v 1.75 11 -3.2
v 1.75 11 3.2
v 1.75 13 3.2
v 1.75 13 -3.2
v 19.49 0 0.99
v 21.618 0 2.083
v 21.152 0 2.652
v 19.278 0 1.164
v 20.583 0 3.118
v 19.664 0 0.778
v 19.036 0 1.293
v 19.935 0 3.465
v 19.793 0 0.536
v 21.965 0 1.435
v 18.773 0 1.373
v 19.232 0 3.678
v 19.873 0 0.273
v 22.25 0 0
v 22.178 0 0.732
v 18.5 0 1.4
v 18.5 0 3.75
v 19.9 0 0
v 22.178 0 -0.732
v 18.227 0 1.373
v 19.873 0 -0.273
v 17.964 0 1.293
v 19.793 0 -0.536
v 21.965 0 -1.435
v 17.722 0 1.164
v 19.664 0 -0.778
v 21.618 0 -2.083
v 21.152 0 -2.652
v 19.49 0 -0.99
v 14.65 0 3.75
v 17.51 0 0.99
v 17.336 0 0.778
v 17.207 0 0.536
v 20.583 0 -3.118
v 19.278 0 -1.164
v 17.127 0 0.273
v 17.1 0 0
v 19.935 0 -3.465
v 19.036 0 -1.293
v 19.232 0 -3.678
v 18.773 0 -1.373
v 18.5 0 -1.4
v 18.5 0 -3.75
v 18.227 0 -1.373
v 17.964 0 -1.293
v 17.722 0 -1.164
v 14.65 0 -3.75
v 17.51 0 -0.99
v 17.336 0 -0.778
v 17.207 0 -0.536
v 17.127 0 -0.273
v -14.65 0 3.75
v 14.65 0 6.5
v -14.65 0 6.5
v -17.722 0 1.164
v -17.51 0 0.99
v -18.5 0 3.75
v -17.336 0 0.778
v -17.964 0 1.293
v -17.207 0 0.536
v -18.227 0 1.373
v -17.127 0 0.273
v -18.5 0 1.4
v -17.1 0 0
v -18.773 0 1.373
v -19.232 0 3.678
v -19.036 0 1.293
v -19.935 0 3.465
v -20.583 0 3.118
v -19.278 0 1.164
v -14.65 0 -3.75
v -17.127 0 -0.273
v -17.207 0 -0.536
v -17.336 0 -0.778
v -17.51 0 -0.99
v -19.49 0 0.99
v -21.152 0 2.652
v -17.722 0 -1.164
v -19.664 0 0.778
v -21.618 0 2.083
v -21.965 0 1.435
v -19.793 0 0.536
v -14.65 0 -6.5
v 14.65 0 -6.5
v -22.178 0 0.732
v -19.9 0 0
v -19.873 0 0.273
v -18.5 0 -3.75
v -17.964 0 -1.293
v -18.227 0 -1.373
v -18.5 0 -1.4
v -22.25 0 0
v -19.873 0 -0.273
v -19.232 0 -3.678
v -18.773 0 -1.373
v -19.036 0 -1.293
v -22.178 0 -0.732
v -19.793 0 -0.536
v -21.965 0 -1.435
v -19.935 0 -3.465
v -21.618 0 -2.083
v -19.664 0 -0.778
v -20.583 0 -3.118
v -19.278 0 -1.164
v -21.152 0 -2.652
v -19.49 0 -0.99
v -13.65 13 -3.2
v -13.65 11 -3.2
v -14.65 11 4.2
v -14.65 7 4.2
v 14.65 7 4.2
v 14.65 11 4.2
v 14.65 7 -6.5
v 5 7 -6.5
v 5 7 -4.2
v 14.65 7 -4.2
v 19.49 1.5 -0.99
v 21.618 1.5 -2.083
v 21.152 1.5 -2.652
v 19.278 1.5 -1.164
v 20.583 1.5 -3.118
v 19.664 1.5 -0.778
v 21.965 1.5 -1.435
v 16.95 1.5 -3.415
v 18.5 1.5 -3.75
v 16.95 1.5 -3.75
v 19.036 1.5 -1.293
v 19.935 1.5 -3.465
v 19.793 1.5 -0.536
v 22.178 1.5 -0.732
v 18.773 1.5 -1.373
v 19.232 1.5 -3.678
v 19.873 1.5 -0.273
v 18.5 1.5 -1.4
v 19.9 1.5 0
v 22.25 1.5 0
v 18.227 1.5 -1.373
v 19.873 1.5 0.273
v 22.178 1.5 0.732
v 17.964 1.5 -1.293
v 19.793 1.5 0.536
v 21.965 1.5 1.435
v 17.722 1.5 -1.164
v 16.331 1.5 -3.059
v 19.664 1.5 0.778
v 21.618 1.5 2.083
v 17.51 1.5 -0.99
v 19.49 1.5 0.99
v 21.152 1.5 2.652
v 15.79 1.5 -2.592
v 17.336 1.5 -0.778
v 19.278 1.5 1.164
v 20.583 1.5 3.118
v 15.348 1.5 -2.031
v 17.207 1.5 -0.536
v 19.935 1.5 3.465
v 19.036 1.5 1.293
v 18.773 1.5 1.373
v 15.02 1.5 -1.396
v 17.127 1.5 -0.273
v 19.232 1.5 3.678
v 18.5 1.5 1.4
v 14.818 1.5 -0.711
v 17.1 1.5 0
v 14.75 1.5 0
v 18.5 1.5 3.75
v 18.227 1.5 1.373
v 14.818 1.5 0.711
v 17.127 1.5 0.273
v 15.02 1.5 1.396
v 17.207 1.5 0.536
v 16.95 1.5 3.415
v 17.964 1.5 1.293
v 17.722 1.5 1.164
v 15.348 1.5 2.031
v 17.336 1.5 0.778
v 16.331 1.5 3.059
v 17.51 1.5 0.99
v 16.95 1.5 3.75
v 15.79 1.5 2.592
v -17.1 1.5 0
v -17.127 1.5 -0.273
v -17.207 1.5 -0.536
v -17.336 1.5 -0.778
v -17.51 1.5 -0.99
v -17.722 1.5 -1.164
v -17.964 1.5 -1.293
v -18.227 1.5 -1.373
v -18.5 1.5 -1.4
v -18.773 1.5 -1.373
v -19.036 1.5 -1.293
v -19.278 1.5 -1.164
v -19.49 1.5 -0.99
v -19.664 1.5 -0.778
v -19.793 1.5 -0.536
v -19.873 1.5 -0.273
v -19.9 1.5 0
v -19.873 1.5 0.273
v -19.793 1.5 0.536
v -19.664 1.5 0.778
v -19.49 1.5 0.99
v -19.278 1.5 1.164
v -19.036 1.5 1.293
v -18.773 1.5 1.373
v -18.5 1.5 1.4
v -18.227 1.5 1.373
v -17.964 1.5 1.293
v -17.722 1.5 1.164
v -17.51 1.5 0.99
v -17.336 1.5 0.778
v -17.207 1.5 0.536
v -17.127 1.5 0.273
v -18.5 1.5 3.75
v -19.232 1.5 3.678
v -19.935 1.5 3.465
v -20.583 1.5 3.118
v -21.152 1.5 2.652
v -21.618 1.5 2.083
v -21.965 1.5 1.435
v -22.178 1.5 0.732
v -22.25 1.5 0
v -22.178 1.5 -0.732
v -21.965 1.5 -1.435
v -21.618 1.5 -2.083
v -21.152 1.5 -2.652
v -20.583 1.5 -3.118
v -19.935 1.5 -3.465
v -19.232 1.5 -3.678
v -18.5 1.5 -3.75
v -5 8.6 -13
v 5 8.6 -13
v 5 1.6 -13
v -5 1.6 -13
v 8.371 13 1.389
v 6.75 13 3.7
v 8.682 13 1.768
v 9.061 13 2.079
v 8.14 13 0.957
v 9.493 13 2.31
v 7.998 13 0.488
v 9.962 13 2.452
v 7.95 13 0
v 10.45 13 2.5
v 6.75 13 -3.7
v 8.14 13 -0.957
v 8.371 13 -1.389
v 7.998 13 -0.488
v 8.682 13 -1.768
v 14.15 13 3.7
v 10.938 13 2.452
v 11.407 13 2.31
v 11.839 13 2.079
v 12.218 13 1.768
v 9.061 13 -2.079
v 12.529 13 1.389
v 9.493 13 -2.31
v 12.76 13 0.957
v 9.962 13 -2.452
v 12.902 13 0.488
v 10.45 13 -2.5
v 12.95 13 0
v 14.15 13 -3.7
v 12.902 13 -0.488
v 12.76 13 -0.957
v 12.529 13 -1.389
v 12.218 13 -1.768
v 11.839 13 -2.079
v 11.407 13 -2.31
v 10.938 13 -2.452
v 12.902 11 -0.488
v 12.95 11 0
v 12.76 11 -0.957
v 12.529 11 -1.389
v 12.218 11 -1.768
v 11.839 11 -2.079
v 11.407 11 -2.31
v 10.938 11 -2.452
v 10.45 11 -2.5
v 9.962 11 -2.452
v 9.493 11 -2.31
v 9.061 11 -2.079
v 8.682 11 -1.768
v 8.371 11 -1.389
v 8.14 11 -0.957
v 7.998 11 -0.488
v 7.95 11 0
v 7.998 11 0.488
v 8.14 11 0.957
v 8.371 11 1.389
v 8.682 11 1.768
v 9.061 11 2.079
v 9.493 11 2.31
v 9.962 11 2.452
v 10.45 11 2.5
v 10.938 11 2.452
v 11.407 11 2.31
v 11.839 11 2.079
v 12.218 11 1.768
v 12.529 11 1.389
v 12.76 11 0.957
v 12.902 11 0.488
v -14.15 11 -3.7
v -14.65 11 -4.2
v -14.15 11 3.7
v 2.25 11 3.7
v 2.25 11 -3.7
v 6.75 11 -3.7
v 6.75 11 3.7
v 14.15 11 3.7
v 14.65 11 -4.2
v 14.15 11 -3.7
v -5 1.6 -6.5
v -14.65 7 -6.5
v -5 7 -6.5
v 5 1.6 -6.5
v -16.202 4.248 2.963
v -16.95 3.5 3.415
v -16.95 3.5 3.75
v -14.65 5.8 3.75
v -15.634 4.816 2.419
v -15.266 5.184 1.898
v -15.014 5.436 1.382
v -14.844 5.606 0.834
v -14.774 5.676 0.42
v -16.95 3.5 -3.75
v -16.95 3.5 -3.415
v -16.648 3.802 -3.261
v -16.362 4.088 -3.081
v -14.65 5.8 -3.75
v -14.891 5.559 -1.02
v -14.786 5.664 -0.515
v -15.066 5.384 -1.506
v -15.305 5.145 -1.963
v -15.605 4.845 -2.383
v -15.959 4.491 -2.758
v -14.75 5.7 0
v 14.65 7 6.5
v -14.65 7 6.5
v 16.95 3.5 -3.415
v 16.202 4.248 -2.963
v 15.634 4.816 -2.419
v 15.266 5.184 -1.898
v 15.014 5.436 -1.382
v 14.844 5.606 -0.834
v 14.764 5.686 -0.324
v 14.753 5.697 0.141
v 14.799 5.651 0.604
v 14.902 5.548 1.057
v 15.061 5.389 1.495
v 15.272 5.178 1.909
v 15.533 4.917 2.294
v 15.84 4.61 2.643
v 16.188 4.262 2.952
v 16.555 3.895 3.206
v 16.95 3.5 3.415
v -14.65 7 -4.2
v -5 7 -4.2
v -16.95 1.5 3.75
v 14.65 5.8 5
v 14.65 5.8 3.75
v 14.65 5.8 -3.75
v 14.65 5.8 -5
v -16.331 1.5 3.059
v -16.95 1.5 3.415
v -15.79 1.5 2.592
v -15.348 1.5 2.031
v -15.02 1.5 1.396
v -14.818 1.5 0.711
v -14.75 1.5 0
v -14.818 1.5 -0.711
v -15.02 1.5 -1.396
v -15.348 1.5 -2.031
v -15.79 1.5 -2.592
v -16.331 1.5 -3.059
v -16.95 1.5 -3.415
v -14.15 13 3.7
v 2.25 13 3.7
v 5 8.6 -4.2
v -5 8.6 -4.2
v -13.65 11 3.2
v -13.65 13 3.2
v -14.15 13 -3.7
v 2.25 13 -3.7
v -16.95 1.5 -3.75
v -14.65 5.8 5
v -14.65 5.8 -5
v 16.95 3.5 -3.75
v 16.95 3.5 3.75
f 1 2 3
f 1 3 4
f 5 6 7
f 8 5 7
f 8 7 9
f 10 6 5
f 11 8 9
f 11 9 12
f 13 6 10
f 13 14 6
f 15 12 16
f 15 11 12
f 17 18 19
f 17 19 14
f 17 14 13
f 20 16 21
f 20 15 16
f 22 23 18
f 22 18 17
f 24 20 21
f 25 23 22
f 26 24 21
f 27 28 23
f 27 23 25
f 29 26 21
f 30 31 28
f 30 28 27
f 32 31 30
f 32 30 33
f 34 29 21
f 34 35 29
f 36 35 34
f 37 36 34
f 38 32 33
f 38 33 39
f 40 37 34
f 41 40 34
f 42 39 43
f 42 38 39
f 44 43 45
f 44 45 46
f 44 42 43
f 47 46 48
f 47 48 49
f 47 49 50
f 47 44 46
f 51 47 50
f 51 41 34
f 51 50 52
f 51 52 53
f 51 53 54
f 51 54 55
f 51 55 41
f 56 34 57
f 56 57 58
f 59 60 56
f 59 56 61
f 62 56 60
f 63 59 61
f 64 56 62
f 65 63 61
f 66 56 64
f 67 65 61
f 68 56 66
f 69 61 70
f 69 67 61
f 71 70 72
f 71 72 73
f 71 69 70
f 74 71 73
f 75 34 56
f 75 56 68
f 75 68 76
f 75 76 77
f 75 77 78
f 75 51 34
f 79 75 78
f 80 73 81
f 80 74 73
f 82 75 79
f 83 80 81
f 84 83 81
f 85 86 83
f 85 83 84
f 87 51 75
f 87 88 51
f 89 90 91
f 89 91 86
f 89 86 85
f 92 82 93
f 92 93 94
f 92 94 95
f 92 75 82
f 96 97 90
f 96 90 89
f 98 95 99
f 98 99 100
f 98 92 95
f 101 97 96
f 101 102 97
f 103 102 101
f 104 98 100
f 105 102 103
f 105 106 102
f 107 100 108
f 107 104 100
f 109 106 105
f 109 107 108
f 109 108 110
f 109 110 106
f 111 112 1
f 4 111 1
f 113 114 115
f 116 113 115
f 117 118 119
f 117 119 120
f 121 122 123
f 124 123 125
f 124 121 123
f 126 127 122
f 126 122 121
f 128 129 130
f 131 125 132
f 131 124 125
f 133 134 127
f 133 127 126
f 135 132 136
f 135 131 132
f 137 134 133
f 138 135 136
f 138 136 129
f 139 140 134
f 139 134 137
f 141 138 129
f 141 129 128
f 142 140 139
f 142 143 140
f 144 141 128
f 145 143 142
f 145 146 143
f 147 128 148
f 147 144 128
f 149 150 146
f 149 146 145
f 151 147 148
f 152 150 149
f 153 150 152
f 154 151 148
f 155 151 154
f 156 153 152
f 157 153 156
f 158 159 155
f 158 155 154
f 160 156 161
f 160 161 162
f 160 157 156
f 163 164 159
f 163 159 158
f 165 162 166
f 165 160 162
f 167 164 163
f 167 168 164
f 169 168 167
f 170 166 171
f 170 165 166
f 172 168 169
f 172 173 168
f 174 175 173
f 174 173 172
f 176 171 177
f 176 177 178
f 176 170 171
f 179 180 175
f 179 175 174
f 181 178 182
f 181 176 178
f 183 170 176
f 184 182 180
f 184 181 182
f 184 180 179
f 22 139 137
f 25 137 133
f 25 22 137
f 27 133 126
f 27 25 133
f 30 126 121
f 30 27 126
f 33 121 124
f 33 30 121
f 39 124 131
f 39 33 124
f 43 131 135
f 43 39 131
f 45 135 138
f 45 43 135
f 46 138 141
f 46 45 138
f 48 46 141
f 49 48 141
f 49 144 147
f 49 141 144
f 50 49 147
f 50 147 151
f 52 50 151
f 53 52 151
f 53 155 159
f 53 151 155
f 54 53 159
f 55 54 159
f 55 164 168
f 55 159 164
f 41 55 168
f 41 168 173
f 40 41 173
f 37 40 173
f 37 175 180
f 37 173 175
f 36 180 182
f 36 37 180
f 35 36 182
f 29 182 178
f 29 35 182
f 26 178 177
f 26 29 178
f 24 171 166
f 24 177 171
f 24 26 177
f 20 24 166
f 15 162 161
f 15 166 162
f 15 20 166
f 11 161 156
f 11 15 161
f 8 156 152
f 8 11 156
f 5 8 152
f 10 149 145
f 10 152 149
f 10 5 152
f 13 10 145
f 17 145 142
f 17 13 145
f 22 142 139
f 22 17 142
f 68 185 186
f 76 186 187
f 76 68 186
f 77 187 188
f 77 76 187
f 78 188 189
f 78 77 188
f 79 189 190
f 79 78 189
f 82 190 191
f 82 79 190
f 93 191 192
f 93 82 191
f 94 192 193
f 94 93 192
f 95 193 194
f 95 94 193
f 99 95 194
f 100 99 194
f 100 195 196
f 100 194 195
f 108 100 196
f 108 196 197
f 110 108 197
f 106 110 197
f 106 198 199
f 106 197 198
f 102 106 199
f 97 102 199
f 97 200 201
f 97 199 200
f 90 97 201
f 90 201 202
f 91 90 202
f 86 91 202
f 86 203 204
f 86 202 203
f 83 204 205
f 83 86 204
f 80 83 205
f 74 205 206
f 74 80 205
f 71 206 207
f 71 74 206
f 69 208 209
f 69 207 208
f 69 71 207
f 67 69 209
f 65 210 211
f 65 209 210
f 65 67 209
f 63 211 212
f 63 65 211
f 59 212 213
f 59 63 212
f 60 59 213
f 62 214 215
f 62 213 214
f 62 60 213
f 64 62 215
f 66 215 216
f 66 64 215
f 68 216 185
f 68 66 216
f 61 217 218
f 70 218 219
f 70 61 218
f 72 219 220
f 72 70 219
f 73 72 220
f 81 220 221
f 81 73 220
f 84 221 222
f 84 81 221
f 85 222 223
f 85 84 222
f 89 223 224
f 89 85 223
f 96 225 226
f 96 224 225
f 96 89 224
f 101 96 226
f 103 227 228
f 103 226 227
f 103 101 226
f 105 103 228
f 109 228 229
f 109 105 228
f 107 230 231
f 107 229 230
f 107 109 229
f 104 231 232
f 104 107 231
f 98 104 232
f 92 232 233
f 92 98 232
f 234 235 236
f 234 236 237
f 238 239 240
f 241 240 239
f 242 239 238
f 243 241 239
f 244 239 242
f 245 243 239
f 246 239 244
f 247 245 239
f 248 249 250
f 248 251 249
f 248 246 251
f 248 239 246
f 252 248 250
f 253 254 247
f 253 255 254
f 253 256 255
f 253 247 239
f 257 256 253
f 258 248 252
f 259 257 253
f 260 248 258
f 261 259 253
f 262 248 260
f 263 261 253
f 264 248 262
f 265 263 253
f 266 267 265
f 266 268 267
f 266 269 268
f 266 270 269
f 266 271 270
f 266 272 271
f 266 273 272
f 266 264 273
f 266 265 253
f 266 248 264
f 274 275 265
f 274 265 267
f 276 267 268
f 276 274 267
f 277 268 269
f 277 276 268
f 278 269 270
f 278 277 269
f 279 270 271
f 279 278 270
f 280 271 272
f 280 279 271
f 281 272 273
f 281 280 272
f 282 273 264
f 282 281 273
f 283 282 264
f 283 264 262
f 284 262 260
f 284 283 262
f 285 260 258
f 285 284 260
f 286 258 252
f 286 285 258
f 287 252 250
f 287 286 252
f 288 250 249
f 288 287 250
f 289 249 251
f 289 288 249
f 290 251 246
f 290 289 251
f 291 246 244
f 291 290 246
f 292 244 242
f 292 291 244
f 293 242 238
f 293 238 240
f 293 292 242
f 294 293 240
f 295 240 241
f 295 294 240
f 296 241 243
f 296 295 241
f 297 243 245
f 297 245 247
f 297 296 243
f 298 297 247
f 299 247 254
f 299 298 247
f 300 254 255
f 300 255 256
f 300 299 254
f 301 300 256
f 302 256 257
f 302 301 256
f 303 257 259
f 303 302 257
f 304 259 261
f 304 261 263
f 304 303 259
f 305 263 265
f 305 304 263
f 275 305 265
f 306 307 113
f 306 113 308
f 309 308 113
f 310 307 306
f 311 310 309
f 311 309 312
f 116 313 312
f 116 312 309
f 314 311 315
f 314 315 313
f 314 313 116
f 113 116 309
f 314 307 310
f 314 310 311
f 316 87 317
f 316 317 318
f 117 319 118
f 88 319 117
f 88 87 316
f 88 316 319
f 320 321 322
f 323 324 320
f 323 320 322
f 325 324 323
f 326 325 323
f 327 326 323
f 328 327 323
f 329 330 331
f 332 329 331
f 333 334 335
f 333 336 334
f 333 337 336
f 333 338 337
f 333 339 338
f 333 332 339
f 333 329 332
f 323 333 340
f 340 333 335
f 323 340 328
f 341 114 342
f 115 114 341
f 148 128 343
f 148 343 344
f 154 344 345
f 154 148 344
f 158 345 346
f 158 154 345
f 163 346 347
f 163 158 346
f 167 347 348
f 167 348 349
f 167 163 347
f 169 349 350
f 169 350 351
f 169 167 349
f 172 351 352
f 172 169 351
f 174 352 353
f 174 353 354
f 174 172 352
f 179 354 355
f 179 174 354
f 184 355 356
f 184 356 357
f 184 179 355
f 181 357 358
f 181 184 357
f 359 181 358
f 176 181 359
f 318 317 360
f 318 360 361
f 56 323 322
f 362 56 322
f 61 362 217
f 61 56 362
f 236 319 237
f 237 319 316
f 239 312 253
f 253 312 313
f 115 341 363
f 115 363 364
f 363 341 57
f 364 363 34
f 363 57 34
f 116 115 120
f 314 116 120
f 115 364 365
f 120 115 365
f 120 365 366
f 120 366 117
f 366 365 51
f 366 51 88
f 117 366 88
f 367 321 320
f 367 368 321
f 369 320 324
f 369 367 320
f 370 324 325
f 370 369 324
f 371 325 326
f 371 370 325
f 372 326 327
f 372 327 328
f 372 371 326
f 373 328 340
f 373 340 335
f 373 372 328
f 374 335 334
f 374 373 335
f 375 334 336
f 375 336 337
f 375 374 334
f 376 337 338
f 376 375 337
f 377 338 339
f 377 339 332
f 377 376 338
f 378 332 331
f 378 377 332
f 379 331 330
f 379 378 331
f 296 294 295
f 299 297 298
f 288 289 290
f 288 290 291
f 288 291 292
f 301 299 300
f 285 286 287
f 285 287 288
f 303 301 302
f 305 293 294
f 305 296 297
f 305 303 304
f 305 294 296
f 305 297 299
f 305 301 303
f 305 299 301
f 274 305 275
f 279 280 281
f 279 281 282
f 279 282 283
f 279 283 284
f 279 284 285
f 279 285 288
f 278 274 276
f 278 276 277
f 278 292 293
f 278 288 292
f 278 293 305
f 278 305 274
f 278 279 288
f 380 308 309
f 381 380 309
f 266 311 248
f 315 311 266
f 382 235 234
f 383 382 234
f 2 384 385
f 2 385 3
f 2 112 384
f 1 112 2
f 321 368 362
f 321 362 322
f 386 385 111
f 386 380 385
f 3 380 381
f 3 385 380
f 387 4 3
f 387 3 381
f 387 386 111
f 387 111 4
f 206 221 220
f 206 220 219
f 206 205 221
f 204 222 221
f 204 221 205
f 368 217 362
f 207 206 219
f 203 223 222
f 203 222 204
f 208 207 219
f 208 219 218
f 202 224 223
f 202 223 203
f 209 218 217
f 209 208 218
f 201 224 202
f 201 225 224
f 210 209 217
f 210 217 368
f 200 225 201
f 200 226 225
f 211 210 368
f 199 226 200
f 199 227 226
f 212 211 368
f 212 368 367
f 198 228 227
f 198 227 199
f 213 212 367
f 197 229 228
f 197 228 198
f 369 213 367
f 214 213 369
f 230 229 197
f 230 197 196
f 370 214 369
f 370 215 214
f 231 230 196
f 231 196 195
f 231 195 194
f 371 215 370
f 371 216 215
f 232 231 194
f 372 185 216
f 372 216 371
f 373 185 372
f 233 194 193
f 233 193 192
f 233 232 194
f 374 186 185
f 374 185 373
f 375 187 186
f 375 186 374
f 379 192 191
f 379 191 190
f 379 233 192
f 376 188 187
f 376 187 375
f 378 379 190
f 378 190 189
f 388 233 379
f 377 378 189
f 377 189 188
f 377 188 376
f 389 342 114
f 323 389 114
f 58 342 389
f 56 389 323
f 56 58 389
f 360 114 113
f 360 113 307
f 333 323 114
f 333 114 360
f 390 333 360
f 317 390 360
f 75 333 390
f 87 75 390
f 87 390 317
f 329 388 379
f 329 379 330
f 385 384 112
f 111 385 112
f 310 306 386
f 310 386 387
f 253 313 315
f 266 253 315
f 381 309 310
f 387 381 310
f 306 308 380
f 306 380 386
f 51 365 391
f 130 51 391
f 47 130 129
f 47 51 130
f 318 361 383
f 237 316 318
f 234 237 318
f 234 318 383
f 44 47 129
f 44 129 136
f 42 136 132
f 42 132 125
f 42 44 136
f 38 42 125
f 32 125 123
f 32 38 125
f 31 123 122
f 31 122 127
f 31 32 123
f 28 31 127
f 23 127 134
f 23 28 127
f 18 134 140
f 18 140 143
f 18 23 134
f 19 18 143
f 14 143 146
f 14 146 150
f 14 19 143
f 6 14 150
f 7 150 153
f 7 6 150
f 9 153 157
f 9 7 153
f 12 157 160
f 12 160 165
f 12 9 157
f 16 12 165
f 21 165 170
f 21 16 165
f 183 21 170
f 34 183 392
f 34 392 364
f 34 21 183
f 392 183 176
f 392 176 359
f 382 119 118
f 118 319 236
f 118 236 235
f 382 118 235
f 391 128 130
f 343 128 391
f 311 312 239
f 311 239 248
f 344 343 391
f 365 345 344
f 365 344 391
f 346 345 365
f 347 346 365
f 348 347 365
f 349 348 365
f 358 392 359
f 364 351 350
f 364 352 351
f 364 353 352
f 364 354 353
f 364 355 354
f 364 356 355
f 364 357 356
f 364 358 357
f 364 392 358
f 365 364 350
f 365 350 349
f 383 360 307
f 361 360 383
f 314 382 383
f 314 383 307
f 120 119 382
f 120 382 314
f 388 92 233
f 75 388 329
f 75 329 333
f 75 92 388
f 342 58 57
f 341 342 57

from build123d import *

# Parameters (mm, degrees)
SKETCH_1_W                  = 29.3
SKETCH_1_H                  = 13
EXTRUDE_1_DEPTH             = 7
SKETCH_2_W                  = 29.3
SKETCH_2_H                  = 8.4
EXTRUDE_2_DEPTH             = 4
SKETCH_3_W                  = 16.4
SKETCH_3_H                  = 7.4
SKETCH_3_W_2                = 15.4
SKETCH_3_H_2                = 6.4
SKETCH_3_W_3                = 7.4
SKETCH_3_R                  = 2.5
EXTRUDE_3_DEPTH             = 2
SKETCH_5_R                  = 1.4
EXTRUDE_4_DEPTH             = 5.8
CUT_EXTRUDE_1_DEPTH         = 5
SKETCH_7_R                  = 3.75
CUT_EXTRUDE_2_DEPTH         = 10
SKETCH_8_W                  = 10
SKETCH_8_H                  = 7
EXTRUDE_5_DEPTH             = 6.5
EXTRUDE_5_DIRECTION_2_REACH = 15


with BuildPart() as part:
    # 草图1 → 凸台-拉伸1 (new body)
    with BuildSketch(Plane(origin=(0, 0, 0), x_dir=(1, 0, 0), z_dir=(0, 1, 0))):
        Rectangle(SKETCH_1_W, SKETCH_1_H)
    extrude(amount=EXTRUDE_1_DEPTH)

    # 草图2 → 凸台-拉伸2 (add)
    with BuildSketch(Plane(origin=(0, 7, 0), x_dir=(1, 0, 0), z_dir=(0, 1, 0))):
        Rectangle(SKETCH_2_W, SKETCH_2_H)
    extrude(amount=EXTRUDE_2_DEPTH)

    # 草图3 → 凸台-拉伸3 (add)
    with BuildSketch(Plane(origin=(0, 11, 0), x_dir=(1, 0, 0), z_dir=(0, 1, 0))):
        with Locations((-5.95, 0)):
            Rectangle(SKETCH_3_W, SKETCH_3_H)
        with Locations((-5.95, 0)):
            Rectangle(SKETCH_3_W_2, SKETCH_3_H_2, mode=Mode.SUBTRACT)
        with Locations((10.45, 0)):
            Rectangle(SKETCH_3_W_3, SKETCH_3_H)
        with Locations((10.45, 0)):
            Circle(SKETCH_3_R, mode=Mode.SUBTRACT)
    extrude(amount=EXTRUDE_3_DEPTH)

    # 草图5 → 凸台-拉伸4 (add)
    with BuildSketch(Plane(origin=(0, 0, 0), x_dir=(1, 0, 0), z_dir=(0, 1, 0))):
        with BuildLine():
            Line((-18.5, 3.75), (18.5, 3.75))
            ThreePointArc((18.5, 3.75), (22.25, 0), (18.5, -3.75))
            Line((18.5, -3.75), (-18.5, -3.75))
            ThreePointArc((-18.5, -3.75), (-22.25, 0), (-18.5, 3.75))
        make_face()
        with Locations((18.5, 0)):
            Circle(SKETCH_5_R, mode=Mode.SUBTRACT)
        with Locations((-18.5, 0)):
            Circle(SKETCH_5_R, mode=Mode.SUBTRACT)
    extrude(amount=EXTRUDE_4_DEPTH)

    # 草图6 → 切除-拉伸1 (cut, symmetric)
    with BuildSketch(Plane.XY):
        Polygon((-22.25, 1.5), (-16.95, 1.5), (-16.95, 3.5), (-14.65, 5.8), (-22.25, 5.8), align=None)
        Polygon((22.25, 5.8), (22.25, 1.5), (16.95, 1.5), (16.95, 3.5), (14.65, 5.8), align=None)
    extrude(amount=CUT_EXTRUDE_1_DEPTH, both=True, mode=Mode.SUBTRACT)

    # 草图7 → 切除-拉伸2 (cut)
    with BuildSketch(Plane(origin=(0, 1.5, 0), x_dir=(1, 0, 0), z_dir=(0, 1, 0))):
        with Locations((18.5, 0)):
            Circle(SKETCH_7_R)
        with Locations((-18.5, 0)):
            Circle(SKETCH_7_R)
    extrude(amount=CUT_EXTRUDE_2_DEPTH, mode=Mode.SUBTRACT)

    # 草图8 → 凸台-拉伸5 (add)
    with BuildSketch(Plane(origin=(0, 0, -6.5), x_dir=(-1, 0, 0), z_dir=(0, 0, -1))):
        with Locations((0, 5.1)):
            Rectangle(SKETCH_8_W, SKETCH_8_H)
    extrude(amount=EXTRUDE_5_DEPTH)

    # 草图8 → 凸台-拉伸5 direction 2 (add, up to next)
    with BuildSketch(Plane(origin=(0, 0, -6.5), x_dir=(-1, 0, 0), z_dir=(0, 0, -1)), mode=Mode.PRIVATE) as extrude_5_direction_2_sk1:
        with Locations((0, 5.1)):
            Rectangle(SKETCH_8_W, SKETCH_8_H)
    extrude_5_direction_2_tool1 = extrude(extrude_5_direction_2_sk1.sketch, amount=-EXTRUDE_5_DIRECTION_2_REACH, mode=Mode.PRIVATE) - part.part
    add(extrude_5_direction_2_tool1.solids().sort_by_distance((0, 5.1, -6.5))[0])


solid = part.part
